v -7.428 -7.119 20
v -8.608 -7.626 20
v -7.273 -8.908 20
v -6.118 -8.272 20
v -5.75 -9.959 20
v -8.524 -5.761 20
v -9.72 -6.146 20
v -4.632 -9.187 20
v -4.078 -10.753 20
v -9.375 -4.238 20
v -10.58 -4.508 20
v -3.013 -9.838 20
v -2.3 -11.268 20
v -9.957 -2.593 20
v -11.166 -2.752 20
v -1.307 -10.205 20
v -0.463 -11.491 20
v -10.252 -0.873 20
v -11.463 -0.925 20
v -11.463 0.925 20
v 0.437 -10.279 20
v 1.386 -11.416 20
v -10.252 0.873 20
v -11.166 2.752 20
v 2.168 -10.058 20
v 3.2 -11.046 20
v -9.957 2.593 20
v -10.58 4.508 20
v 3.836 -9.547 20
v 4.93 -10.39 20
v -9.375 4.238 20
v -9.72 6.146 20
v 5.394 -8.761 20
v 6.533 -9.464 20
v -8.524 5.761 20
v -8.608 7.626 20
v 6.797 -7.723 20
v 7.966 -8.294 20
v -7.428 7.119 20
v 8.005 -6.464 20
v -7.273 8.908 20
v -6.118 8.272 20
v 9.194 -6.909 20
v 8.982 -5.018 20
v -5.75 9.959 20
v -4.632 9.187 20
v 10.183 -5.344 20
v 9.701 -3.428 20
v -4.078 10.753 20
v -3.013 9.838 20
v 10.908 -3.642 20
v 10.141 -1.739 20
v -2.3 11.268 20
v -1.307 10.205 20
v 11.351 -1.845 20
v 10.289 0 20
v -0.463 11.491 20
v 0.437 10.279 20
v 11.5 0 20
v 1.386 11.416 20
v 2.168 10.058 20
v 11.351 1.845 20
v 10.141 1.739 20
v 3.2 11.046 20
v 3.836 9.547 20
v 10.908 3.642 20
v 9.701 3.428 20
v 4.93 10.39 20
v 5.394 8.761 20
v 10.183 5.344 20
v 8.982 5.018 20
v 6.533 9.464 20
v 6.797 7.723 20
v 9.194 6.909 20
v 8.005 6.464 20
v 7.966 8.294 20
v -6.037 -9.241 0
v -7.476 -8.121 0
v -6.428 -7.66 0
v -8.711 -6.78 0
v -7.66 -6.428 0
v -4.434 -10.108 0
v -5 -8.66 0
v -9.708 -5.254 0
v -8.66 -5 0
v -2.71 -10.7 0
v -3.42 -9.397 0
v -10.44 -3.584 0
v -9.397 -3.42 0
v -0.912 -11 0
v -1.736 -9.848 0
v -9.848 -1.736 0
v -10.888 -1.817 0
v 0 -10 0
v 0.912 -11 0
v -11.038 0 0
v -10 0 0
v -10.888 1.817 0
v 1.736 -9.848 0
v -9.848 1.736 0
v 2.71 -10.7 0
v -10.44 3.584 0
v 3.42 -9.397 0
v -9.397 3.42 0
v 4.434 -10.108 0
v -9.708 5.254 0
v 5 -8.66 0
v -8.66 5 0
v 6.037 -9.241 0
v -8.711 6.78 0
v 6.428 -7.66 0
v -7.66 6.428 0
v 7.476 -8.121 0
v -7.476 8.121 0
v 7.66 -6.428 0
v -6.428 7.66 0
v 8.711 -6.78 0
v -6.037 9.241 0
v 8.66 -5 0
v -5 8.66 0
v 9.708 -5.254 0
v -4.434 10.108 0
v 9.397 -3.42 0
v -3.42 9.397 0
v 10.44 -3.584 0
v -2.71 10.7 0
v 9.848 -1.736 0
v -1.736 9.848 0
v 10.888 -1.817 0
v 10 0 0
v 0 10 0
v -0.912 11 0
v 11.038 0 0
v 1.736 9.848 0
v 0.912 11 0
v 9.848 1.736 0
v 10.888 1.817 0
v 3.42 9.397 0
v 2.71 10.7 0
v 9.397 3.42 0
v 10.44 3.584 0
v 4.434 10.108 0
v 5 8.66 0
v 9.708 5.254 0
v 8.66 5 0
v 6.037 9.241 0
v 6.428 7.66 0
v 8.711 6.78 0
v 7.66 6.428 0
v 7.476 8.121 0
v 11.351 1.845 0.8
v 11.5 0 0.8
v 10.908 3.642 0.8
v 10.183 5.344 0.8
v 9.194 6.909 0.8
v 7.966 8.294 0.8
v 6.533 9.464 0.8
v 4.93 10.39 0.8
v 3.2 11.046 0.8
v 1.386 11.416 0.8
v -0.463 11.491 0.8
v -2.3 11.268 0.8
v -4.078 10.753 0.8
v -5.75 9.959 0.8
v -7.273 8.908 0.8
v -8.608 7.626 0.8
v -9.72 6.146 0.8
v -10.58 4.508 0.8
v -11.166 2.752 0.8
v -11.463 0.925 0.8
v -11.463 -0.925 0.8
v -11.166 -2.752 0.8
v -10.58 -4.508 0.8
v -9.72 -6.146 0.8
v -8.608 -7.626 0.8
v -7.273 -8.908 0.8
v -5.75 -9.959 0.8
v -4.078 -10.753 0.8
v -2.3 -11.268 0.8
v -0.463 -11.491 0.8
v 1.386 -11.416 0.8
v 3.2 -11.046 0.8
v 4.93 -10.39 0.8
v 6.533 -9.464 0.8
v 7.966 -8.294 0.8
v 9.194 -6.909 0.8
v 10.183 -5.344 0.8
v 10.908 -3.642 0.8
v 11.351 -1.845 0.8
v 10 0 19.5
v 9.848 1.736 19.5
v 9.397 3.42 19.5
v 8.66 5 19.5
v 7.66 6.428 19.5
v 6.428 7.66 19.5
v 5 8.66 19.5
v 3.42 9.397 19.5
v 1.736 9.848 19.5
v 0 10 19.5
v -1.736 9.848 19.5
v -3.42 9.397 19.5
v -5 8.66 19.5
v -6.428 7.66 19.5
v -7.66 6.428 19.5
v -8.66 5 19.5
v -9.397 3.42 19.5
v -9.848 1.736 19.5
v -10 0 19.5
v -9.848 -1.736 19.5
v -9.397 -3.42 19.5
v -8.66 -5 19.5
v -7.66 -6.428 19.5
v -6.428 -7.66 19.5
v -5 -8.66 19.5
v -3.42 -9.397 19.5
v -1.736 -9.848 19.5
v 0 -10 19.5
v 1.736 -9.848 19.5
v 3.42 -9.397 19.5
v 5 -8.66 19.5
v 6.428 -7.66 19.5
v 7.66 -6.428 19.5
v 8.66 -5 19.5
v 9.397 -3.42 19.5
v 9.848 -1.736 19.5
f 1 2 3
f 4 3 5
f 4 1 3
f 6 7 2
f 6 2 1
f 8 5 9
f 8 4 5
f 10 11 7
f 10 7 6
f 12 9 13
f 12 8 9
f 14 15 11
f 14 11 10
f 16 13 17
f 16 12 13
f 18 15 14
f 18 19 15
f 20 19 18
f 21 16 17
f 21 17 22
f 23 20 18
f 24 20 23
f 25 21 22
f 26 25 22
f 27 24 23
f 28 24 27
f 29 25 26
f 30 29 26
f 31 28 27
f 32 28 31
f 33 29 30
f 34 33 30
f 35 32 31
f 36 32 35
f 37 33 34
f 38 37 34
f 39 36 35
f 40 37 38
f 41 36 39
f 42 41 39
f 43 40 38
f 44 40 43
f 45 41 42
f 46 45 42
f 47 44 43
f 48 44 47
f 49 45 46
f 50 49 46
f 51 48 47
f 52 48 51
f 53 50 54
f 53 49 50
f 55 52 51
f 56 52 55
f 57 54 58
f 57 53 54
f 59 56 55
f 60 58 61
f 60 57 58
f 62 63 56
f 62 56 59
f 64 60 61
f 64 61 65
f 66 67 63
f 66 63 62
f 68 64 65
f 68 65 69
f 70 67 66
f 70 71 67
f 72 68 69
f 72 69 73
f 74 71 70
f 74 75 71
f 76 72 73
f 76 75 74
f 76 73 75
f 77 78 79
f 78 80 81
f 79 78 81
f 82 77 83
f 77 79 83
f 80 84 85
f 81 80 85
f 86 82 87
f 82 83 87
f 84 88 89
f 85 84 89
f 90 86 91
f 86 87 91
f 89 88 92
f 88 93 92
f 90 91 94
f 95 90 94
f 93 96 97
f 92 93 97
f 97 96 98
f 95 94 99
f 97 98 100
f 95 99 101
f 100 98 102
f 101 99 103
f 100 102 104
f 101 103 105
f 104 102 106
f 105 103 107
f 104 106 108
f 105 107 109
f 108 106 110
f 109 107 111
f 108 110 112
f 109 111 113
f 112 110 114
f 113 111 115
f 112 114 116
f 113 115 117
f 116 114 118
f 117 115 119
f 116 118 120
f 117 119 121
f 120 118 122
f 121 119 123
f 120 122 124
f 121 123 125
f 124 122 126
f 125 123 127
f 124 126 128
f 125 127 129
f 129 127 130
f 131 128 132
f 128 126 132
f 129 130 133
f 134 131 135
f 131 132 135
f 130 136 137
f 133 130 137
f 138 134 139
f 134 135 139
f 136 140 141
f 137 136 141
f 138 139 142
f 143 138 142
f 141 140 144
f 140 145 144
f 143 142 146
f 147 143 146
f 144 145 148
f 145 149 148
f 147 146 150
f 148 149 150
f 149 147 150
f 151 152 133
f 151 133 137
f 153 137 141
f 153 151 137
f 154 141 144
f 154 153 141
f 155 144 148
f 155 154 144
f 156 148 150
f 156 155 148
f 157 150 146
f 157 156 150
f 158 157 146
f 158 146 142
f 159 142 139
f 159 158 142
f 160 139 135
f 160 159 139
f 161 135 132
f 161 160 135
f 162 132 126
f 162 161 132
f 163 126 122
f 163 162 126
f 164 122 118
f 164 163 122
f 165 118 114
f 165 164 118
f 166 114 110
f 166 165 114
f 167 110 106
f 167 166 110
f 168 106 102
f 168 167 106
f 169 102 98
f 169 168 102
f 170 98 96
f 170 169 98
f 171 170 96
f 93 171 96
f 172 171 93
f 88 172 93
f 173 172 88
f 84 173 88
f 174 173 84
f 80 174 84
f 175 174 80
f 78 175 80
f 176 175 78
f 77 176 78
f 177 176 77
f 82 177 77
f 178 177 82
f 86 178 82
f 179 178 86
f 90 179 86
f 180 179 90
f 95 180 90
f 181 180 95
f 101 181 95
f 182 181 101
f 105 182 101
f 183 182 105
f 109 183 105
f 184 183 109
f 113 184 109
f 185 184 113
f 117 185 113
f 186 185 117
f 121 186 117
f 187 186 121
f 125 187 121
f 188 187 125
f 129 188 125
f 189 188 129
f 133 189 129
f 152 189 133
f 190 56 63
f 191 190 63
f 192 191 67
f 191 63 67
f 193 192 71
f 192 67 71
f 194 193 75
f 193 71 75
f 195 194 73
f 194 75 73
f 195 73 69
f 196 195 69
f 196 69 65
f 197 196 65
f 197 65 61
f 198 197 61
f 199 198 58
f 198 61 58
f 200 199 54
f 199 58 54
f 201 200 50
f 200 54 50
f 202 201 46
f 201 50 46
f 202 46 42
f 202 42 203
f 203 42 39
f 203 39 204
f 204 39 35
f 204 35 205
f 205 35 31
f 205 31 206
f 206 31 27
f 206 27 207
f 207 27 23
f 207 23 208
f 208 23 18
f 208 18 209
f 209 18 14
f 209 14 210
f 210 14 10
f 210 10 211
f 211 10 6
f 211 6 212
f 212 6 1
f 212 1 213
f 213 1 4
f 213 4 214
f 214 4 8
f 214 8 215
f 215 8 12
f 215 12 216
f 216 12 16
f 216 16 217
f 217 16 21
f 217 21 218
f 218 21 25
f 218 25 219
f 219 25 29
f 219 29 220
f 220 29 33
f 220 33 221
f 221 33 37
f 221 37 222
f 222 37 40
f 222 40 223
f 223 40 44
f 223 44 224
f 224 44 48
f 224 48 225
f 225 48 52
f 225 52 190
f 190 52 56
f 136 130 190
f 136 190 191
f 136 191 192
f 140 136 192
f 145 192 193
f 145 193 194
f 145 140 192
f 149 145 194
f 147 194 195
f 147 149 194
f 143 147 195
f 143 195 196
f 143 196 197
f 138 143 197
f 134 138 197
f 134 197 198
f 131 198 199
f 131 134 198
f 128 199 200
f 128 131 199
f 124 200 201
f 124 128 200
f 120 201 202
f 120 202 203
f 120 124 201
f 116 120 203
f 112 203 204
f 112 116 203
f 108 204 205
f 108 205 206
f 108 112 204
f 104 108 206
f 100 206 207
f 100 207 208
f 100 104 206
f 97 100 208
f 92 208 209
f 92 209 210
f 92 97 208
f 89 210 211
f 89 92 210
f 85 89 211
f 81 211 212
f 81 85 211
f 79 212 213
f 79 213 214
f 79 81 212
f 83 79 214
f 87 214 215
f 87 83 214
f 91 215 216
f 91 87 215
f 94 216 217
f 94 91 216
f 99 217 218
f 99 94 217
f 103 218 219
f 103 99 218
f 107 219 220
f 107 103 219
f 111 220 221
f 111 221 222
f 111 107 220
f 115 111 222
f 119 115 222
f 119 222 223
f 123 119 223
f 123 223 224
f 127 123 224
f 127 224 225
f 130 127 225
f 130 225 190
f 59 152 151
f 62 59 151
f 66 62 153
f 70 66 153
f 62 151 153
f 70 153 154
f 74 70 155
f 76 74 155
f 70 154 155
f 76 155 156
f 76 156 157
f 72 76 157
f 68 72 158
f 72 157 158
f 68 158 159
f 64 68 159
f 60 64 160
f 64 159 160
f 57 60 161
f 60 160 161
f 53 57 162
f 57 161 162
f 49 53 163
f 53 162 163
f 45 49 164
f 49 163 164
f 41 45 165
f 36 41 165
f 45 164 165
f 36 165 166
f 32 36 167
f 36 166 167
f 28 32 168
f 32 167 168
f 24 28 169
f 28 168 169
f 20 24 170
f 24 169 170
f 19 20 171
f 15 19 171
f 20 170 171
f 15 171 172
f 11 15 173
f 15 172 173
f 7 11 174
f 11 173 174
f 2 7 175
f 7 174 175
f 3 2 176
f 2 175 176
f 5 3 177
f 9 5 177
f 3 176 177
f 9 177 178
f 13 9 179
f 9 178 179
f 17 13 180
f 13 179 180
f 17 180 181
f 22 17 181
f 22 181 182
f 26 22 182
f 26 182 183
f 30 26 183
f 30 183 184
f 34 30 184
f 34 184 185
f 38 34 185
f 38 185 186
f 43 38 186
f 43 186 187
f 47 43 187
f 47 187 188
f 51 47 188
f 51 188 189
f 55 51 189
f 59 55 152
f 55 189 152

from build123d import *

# Parameters (mm, degrees)
SKICA1_R        = 11.5
SKICA1_R_2      = 10
VYSUNOUT1_DEPTH = 20
ZKOSIT1_SIZE    = 0.5
ZKOSIT1_SIZE2   = 0.288675135
ZKOSIT2_SIZE    = 0.461880215
ZKOSIT2_SIZE2   = 0.8


with BuildPart() as part:
    # Skica1 → Vysunout1 (new body)
    with BuildSketch(Plane.XY):
        Circle(SKICA1_R)
        Circle(SKICA1_R_2, mode=Mode.SUBTRACT)
    extrude(amount=VYSUNOUT1_DEPTH)

    # Zkosit1
    zkosit1_edges = [part.edges().sort_by_distance(p)[0] for p in [
        (-10, 0, 20),
    ]]
    zkosit1_side = [part.faces().sort_by_distance(p)[0] for p in [
        (-10, 0, 10),
    ]]
    chamfer(zkosit1_edges, length=ZKOSIT1_SIZE, length2=ZKOSIT1_SIZE2, reference=zkosit1_side[0])

    # Zkosit2
    zkosit2_edges = [part.edges().sort_by_distance(p)[0] for p in [
        (-11.5, 0, 0),
    ]]
    zkosit2_side = [part.faces().sort_by_distance(p)[0] for p in [
        (-11.174730881, 0, 0),
    ]]
    chamfer(zkosit2_edges, length=ZKOSIT2_SIZE, length2=ZKOSIT2_SIZE2, reference=zkosit2_side[0])


solid = part.part
